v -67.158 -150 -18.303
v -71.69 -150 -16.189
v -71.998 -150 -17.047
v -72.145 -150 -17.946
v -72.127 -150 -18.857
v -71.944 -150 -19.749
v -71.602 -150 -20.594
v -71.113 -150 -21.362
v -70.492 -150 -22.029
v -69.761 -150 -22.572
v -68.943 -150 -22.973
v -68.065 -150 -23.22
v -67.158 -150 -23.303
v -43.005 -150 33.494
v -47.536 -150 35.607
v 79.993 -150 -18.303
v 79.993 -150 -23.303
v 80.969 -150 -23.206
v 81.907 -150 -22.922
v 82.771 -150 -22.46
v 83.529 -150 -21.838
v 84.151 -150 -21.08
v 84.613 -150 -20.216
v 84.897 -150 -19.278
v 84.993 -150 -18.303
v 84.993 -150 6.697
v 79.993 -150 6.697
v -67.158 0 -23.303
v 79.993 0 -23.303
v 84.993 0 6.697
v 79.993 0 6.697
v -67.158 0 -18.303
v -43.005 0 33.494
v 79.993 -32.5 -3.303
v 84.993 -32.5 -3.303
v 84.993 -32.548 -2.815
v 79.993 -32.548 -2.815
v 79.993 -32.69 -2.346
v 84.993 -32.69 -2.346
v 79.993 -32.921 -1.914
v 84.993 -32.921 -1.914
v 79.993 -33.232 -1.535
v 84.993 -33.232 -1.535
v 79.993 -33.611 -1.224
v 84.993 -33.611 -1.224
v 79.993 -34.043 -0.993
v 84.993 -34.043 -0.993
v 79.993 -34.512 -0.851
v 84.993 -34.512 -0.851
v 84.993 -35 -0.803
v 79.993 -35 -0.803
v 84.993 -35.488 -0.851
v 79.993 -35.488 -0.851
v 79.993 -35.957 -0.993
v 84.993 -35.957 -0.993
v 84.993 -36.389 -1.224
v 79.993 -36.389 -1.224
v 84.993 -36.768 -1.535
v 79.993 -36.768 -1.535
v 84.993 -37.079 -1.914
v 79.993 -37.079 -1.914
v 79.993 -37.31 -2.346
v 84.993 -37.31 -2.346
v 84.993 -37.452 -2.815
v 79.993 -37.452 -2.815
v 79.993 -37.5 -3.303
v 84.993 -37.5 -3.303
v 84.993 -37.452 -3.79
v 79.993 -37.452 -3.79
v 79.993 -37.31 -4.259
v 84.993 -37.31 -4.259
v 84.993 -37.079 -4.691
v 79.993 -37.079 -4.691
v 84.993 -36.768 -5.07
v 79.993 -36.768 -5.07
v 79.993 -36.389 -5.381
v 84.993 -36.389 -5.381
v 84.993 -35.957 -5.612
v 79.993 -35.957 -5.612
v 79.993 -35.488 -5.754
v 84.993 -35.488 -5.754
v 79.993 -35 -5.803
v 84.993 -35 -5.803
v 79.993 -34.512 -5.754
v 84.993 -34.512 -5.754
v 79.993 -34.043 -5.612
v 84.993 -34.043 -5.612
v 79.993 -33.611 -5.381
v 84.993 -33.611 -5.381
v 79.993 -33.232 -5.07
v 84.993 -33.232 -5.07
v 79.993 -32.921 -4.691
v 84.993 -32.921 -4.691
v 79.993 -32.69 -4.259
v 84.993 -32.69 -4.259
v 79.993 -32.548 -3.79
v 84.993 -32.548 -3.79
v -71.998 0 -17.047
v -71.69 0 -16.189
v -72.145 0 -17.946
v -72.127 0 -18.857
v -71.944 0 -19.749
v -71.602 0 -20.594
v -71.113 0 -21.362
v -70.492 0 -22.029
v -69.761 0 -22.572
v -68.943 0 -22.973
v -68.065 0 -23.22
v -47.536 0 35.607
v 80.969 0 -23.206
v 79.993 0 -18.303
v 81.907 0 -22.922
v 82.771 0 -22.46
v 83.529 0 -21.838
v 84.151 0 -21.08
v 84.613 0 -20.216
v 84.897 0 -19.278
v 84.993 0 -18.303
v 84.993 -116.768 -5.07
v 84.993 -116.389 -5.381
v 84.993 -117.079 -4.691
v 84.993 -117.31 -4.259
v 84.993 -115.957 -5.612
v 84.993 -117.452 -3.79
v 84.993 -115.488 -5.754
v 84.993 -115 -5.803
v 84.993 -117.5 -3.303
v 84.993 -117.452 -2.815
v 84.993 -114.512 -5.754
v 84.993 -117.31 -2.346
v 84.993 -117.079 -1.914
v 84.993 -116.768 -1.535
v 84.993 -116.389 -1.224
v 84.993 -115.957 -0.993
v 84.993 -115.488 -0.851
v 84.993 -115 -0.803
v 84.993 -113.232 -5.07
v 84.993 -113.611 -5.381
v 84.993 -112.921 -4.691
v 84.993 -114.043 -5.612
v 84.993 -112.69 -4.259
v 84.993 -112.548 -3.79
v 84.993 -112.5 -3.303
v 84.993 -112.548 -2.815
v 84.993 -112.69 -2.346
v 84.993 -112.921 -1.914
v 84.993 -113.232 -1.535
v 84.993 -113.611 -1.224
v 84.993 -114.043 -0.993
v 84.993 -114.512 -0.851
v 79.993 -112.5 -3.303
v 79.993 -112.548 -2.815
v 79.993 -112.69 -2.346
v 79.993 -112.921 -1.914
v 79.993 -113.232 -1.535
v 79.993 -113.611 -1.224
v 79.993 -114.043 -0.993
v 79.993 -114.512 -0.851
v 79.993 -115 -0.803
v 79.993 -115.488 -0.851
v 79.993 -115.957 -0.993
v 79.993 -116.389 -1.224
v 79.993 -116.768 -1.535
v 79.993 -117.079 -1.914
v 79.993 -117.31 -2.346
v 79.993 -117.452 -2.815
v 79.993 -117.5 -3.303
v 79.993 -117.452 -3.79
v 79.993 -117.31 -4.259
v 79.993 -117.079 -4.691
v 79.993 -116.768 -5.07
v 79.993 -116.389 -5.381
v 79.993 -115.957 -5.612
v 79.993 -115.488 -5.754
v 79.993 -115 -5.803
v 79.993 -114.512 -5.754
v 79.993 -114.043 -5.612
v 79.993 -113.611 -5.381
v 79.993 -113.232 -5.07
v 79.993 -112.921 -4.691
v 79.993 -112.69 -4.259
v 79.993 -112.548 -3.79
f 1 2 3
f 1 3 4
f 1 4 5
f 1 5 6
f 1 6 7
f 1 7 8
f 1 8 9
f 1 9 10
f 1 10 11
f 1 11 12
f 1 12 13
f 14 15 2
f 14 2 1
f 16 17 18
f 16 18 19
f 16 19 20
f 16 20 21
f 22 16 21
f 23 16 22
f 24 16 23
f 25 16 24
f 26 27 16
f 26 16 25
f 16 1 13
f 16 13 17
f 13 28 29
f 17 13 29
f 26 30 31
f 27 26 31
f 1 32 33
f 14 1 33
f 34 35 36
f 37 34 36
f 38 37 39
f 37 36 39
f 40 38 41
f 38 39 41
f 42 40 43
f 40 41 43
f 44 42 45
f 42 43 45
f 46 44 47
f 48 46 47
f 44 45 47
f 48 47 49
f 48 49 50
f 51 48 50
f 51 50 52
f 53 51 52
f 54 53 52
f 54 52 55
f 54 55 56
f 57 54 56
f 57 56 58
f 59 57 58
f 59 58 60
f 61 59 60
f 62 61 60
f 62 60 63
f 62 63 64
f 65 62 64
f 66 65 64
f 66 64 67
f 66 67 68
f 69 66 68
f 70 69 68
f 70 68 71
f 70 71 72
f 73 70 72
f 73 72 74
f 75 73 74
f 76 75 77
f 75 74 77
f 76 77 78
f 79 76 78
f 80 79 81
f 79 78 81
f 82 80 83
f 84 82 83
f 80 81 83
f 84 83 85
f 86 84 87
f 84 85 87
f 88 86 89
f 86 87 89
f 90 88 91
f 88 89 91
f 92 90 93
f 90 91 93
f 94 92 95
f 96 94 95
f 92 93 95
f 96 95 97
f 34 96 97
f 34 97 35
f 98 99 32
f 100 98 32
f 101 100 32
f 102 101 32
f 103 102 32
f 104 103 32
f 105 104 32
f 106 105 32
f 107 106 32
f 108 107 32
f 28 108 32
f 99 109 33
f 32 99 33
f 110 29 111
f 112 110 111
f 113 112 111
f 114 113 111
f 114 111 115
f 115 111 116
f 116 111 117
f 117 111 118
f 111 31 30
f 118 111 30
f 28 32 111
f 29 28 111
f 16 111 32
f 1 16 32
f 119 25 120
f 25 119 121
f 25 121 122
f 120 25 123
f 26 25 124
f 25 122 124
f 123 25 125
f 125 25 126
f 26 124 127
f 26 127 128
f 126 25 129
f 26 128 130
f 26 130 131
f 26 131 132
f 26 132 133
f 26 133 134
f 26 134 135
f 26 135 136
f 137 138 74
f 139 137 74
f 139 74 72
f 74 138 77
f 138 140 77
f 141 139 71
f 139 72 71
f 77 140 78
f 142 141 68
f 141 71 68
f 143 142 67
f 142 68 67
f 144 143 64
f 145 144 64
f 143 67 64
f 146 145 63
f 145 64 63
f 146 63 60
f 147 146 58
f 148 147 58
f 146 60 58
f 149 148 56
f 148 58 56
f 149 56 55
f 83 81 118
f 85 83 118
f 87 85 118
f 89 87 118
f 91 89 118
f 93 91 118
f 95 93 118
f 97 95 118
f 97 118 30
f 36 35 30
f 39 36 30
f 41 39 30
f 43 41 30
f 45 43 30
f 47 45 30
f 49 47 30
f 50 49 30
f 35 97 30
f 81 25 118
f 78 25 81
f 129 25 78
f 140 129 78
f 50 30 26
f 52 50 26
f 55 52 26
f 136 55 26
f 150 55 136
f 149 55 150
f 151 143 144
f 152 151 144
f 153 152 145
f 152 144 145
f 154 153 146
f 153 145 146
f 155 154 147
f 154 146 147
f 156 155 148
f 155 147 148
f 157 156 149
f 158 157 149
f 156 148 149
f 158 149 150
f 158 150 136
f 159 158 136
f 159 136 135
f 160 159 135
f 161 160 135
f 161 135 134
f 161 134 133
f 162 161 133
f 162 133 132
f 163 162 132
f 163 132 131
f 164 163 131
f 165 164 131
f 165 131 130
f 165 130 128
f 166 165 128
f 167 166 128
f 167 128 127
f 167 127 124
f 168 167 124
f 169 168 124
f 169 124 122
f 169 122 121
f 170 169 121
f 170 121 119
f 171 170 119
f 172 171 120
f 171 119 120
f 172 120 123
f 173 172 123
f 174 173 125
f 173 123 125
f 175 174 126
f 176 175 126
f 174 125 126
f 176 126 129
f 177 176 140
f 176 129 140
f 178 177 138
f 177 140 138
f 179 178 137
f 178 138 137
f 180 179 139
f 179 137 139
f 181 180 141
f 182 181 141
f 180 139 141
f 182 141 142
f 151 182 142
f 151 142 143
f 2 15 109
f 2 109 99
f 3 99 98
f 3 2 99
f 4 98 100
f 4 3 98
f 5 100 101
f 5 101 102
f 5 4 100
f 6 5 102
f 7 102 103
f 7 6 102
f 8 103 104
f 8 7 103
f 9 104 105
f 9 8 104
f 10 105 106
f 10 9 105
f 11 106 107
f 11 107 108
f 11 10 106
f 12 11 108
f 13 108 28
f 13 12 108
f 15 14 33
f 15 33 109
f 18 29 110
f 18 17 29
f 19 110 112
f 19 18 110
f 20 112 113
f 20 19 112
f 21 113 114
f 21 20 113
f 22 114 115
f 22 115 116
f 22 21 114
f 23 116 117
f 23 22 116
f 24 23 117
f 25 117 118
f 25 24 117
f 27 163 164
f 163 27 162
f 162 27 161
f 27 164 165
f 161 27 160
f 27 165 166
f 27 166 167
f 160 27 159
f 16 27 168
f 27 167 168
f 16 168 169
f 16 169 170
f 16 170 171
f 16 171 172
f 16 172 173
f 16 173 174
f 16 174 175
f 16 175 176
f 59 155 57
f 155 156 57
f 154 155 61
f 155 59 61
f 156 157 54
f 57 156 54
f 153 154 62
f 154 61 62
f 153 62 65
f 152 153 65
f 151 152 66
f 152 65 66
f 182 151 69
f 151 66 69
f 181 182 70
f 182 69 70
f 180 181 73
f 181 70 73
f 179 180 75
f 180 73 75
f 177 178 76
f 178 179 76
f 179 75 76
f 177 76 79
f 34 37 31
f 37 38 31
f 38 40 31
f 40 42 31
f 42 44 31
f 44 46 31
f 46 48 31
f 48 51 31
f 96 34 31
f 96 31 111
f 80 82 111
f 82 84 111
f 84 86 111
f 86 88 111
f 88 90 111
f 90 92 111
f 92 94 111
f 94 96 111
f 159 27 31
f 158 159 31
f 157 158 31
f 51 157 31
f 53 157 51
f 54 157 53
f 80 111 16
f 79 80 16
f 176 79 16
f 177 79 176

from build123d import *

# Parameters (mm, degrees)
F1_DEPTH = 150
F2_R     = 5
F3_R     = 2.5
F4_DEPTH = 25


with BuildPart() as f1:
    # F0 (on Front) → F1 (new body)
    with BuildSketch(Plane.XZ):
        Polygon((-47.536419, 35.607496), (-75.006606, -23.30251), (84.993394, -23.30251), (84.993394, 6.69749), (79.993394, 6.69749), (79.993394, -18.30251), (-67.158178, -18.30251), (-43.00488, 33.494404), align=None)
    extrude(amount=F1_DEPTH)

    # F2
    f2_edges = [f1.edges().sort_by_distance(p)[0] for p in [
        (-75.006606, -75, -23.30251),
        (84.993394, -75, -23.30251),
    ]]
    fillet(f2_edges, radius=F2_R)

    # F3 (on face) → F4 (cut)
    with BuildSketch(Plane.YZ.offset(84.993394)):
        with Locations((-115, -3.30251)):
            Circle(F3_R)
        with Locations((-35, -3.30251)):
            Circle(F3_R)
    extrude(amount=-F4_DEPTH, mode=Mode.SUBTRACT)


solid = f1.part
